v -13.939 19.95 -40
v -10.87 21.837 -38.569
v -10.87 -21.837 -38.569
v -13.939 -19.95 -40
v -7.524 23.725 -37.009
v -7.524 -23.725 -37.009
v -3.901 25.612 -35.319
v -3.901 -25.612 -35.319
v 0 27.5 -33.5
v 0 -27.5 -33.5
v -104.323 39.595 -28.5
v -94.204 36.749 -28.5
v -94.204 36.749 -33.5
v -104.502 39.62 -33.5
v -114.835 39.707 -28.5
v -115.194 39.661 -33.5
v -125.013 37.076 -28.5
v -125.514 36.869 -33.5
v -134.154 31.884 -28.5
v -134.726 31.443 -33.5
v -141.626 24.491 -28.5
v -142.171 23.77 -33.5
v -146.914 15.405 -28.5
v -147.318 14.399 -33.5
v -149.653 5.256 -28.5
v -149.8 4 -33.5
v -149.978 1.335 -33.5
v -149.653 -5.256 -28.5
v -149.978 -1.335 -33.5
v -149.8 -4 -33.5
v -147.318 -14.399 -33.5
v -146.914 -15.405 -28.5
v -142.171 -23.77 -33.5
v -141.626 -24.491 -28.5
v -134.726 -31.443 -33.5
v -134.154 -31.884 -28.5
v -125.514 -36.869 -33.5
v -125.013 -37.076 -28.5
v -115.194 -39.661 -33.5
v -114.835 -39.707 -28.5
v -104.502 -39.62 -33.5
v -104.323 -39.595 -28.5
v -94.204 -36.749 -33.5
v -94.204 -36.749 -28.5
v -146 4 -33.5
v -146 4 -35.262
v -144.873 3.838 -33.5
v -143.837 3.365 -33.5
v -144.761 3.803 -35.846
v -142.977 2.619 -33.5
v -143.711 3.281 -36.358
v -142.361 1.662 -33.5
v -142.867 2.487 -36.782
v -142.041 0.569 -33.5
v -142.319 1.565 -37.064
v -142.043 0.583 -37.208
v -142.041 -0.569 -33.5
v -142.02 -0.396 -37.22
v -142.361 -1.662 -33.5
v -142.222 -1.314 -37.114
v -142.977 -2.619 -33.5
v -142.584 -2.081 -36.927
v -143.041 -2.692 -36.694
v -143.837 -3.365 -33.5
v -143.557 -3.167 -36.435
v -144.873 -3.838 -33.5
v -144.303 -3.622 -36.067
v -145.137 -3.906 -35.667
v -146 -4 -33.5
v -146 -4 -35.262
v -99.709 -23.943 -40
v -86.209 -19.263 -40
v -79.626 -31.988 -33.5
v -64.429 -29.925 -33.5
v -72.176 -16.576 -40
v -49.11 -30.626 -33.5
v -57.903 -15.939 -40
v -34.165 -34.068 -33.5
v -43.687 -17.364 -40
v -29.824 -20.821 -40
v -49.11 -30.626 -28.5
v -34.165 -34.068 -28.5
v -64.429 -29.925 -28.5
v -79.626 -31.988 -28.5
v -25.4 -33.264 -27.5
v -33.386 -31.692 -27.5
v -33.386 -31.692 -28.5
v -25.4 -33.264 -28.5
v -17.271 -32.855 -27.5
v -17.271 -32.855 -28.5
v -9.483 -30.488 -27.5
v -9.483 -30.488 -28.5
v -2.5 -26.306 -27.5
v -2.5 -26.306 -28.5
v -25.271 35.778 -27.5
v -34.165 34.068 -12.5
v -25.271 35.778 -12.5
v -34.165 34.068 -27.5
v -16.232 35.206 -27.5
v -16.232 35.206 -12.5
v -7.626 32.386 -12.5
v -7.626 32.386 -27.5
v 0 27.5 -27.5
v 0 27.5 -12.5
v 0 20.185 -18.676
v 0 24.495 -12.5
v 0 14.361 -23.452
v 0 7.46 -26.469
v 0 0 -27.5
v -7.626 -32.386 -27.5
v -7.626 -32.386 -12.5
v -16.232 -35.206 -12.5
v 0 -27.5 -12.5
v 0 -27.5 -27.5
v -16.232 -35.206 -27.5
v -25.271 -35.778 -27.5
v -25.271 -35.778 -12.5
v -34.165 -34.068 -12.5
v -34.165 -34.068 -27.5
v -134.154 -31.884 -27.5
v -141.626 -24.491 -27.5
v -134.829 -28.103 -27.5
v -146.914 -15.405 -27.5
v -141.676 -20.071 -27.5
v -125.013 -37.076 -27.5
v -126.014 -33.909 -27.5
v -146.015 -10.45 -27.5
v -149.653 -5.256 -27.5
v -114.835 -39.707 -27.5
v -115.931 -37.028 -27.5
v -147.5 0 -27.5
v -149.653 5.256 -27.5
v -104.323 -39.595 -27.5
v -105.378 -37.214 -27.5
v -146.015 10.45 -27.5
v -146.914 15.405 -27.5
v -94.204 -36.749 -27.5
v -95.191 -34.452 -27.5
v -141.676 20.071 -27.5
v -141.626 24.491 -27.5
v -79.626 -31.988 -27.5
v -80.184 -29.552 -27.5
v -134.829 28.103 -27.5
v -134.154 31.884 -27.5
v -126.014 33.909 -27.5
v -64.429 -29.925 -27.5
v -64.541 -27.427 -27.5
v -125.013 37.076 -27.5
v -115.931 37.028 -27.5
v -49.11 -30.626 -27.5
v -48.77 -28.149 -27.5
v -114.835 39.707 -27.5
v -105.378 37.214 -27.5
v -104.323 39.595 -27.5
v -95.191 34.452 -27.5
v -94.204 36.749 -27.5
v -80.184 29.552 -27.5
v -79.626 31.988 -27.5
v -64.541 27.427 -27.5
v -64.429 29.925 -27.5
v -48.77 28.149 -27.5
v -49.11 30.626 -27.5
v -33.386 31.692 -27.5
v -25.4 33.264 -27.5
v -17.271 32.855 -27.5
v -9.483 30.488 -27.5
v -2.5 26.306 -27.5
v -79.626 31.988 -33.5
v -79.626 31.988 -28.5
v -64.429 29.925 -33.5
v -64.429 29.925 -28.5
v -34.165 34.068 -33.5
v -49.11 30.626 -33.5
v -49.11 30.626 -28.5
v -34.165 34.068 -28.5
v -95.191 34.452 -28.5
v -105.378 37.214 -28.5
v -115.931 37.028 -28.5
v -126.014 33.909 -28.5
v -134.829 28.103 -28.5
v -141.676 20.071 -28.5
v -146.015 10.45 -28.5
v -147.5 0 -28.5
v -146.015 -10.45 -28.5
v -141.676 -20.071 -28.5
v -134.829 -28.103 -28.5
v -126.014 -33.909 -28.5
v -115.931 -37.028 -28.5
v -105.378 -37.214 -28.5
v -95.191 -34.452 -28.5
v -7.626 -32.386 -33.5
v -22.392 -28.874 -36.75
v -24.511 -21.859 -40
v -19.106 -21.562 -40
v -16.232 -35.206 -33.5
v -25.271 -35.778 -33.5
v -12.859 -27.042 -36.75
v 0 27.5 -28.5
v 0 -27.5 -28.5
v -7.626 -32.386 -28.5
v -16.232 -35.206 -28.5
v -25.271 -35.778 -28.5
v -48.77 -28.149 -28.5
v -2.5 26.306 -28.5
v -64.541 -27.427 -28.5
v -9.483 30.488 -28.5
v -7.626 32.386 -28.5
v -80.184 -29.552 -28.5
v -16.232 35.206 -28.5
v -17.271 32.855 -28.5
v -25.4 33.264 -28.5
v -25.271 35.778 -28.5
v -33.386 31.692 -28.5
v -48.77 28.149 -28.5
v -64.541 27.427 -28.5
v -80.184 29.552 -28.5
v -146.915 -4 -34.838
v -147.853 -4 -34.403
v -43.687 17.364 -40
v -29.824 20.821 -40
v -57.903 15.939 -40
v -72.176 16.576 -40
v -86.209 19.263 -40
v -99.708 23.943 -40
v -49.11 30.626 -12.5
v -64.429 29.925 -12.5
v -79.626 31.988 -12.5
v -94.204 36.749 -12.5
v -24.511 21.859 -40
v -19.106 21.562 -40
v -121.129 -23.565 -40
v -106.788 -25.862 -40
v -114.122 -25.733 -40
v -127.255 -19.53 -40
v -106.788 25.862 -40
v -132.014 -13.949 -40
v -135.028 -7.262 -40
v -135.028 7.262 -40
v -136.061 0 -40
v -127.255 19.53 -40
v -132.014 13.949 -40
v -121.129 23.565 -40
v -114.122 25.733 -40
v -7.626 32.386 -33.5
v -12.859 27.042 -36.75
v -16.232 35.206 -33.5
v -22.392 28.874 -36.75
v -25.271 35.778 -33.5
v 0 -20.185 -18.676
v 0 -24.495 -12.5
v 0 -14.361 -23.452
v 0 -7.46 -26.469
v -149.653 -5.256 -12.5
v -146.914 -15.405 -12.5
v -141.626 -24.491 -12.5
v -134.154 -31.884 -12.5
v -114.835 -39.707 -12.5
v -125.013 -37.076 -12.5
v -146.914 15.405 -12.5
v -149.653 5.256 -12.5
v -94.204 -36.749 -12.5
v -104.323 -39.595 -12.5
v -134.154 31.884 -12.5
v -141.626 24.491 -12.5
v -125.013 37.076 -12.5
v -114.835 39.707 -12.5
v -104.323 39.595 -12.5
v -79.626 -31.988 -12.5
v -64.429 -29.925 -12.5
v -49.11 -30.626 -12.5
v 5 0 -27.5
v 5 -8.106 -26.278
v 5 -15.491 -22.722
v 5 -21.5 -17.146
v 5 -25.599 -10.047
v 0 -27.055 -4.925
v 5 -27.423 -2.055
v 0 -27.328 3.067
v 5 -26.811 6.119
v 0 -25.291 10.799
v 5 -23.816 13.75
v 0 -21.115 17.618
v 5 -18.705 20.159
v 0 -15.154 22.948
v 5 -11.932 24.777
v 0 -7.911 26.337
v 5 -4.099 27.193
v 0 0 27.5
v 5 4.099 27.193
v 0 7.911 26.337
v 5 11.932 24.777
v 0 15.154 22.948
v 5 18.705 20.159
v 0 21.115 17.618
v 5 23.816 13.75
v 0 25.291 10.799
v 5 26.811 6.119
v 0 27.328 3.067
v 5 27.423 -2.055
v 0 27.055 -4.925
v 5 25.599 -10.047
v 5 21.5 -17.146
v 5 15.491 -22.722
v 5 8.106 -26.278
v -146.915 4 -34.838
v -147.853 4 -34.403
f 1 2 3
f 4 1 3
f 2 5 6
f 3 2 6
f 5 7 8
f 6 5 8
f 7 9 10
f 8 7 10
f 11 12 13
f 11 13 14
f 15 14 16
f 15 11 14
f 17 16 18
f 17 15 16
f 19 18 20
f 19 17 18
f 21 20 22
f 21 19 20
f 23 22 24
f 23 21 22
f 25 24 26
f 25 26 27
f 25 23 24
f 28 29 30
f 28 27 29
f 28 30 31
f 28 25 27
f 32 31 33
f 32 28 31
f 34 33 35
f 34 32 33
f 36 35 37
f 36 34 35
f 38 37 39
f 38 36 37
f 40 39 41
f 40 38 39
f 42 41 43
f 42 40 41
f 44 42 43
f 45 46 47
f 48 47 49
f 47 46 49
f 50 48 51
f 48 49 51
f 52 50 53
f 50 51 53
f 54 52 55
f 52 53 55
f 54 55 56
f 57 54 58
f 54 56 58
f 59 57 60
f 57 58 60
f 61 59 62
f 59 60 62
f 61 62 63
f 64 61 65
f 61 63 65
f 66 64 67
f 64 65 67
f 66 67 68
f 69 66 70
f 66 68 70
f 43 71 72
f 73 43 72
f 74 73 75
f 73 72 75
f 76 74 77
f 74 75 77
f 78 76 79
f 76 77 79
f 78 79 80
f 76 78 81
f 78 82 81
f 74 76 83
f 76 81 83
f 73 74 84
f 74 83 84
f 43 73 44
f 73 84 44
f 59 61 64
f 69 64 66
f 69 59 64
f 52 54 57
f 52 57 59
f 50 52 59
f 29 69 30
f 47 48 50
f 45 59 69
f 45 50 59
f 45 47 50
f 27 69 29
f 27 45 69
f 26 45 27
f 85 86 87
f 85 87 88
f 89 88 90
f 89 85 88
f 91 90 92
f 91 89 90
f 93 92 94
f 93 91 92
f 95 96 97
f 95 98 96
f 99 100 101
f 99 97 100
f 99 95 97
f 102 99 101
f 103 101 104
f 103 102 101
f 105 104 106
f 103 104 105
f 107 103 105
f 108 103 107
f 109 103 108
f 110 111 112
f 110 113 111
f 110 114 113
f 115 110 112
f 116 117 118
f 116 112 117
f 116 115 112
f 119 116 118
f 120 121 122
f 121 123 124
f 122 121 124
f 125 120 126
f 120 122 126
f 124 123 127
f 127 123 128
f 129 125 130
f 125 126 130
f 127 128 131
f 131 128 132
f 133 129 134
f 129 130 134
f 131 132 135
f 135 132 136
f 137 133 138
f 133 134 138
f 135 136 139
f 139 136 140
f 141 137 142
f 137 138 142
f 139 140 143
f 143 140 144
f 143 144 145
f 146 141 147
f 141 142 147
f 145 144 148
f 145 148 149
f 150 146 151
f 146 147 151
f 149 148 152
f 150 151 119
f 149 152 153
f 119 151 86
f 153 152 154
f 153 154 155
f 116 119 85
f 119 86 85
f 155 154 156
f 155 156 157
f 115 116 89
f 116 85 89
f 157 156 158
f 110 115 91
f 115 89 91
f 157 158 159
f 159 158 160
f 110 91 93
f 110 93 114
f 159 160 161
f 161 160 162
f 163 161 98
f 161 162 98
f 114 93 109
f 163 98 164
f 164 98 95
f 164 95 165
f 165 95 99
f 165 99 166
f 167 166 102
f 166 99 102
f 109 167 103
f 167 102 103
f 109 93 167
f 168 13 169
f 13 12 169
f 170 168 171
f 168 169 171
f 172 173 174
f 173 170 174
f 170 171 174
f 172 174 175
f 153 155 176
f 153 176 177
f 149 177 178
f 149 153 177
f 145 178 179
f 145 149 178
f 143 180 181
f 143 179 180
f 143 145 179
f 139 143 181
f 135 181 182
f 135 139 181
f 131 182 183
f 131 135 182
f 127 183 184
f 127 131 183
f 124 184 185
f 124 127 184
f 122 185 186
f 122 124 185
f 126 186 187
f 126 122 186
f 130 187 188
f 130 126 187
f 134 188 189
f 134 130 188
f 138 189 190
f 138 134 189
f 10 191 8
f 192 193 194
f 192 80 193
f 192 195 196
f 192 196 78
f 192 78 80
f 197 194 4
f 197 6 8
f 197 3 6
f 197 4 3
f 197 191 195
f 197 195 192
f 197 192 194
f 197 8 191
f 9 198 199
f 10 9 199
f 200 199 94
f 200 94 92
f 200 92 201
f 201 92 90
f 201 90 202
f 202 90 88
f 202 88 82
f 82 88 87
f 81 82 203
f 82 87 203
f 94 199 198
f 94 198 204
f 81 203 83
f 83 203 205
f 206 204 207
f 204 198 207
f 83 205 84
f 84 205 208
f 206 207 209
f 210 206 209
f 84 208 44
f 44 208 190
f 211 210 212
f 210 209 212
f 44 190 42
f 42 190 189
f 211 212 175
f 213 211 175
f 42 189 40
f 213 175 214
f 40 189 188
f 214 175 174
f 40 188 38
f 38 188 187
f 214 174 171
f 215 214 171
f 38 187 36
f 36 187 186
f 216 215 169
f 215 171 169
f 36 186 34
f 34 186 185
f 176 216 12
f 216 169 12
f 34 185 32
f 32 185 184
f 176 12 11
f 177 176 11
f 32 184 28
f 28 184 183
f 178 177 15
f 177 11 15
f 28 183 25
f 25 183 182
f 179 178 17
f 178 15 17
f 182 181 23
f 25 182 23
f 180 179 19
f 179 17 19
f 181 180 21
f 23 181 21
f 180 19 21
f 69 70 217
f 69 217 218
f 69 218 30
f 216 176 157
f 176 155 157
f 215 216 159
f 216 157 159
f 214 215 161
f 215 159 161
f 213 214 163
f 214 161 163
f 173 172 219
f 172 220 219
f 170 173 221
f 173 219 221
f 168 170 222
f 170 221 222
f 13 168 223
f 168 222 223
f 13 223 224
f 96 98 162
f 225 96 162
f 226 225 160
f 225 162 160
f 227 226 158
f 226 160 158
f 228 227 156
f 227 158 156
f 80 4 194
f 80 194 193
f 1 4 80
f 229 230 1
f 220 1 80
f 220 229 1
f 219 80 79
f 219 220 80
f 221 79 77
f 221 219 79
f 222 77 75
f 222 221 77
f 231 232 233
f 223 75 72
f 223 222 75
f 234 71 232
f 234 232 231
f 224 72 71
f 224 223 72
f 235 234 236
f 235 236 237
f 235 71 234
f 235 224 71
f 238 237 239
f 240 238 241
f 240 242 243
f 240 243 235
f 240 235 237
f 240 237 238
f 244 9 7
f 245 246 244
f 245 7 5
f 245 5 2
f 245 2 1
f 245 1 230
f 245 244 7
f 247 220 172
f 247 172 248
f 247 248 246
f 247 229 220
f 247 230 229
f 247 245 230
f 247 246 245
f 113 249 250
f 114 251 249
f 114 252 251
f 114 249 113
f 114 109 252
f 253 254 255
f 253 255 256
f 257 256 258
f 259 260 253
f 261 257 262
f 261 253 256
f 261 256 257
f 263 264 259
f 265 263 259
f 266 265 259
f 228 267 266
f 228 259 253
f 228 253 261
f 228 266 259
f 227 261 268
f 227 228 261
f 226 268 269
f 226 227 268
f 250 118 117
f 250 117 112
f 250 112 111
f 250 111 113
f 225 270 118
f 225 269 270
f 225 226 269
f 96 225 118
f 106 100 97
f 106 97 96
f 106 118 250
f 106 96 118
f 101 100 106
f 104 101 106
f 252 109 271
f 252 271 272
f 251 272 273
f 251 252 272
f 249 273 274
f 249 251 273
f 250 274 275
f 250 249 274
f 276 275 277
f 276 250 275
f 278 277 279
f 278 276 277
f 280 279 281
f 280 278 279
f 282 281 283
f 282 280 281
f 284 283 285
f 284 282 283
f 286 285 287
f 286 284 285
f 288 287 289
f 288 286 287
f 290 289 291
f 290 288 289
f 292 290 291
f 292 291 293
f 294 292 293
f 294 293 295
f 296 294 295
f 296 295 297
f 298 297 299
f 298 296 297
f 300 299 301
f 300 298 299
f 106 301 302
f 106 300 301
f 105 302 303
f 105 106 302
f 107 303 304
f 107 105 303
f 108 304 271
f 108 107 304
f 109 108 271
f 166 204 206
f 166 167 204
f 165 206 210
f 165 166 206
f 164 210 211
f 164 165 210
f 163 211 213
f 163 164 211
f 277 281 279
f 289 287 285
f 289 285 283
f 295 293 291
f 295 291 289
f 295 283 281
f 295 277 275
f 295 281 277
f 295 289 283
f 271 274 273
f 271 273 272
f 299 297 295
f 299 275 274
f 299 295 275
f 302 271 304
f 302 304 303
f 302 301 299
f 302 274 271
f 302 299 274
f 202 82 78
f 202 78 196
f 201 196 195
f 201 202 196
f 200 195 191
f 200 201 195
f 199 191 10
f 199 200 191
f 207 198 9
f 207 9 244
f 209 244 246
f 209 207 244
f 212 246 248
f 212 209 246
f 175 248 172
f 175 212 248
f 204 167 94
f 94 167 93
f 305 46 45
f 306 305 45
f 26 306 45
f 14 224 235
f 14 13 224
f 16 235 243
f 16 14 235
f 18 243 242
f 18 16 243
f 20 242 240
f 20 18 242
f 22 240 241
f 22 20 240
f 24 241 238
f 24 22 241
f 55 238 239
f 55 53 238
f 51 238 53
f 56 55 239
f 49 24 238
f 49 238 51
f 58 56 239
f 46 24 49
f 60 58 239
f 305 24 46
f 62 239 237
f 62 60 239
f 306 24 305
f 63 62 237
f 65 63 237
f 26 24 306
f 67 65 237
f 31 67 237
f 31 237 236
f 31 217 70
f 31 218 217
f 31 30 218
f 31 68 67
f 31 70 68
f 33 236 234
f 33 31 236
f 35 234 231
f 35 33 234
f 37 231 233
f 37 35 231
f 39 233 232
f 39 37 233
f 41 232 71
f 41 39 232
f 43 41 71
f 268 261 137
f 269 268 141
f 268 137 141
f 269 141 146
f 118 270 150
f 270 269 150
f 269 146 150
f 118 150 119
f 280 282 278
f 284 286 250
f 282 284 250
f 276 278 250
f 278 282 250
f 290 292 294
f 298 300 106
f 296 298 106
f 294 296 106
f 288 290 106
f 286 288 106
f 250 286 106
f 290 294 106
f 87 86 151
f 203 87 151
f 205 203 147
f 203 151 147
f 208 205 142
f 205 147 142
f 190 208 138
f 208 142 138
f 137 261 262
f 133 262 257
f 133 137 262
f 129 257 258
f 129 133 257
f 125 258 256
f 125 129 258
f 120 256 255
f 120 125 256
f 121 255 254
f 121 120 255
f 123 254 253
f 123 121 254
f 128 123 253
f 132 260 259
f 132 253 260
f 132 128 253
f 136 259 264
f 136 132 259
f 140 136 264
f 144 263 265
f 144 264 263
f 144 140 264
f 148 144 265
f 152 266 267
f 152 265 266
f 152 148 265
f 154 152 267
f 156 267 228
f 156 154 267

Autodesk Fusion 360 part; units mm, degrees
sketch "Sketch1" plane through (0, 0, 0) normal (1, 0, 0) x (0, 0, -1)
  circle A0 centre (0, 0) radius 27.5
  dimension "d1" = 55
extrude "Extrude1" add sketch "Sketch1" along normal blind 5
ref_plane "WorkPlane1" through (0, 0, -27.5) normal (0, 0, 1) x (1, 0, 0)
sketch "Sketch2" plane through (0, 0, -27.5) normal (0, 0, 1) x (1, 0, 0)
  line L0 (0, 0) -> (-150, 0)
  line L1 (0, 0) -> (-23, 0)
  line L2 (-150, 0) -> (-110, 0)
  line L3 (0, 0) -> (0, 27.5)
  circle A0 centre (-23, 0) radius 35.8504
  circle A1 centre (-110, 0) radius 40
  line L4 (0, 27.5) -> (0, -27.5)
  arc A2 (-94.2038, 36.7489) -> (-34.165, 34.0675) centre (-60.6369, 114.8402) ccw
  arc A3 (-34.165, -34.0675) -> (-94.2038, -36.7489) centre (-60.6369, -114.8402) ccw
  point P0 (0, -27.5)
  point P1 (0, 27.5)
  dimension "d6" = 150
  dimension "d7" = 23
  dimension "d8" = 40
  dimension "d9" = 27.5
  dimension "d10" = 85
extrude "Extrude2" add sketch "Sketch2" along normal blind 15 contours L0 L1 A0 L4 | L0 L1 L3 A0 L4 | L0 A0 A1 A3 | L0 A0 A1 A2 | L0 L2 A1 | L0 L2 A1
sketch "Sketch3" plane through (0, 0, -27.5) normal (0, 0, -1) x (-1, 0, 0)
  arc A0 (34.165, 34.0675) -> (0, 27.5) centre (23, 0) ccw
  line L0 (0, 27.5) -> (0, 0)
  line L1 (0, 0) -> (0, -27.5)
  arc A1 (0, -27.5) -> (34.165, -34.0675) centre (23, 0) ccw
  arc A2 (94.2038, -36.7489) -> (34.165, -34.0675) centre (60.6369, -114.8402) ccw
  arc A3 (94.2038, -36.7489) -> (94.2038, 36.7489) centre (110, 0) ccw
  arc A4 (34.165, 34.0675) -> (94.2038, 36.7489) centre (60.6369, 114.8402) ccw
  arc A5 (95.1911, -34.4521) -> (95.1911, 34.4521) centre (110, 0) ccw
  arc A6 (33.3864, 31.6918) -> (95.1911, 34.4521) centre (60.6369, 114.8402) ccw
  arc A7 (33.3864, 31.6918) -> (2.5, 26.3059) centre (23, 0) ccw
  line L2 (2.5, 26.3059) -> (2.5, 0)
  line L3 (2.5, 0) -> (2.5, -26.3059)
  arc A8 (2.5, -26.3059) -> (33.3864, -31.6918) centre (23, 0) ccw
  arc A9 (95.1911, -34.4521) -> (33.3864, -31.6918) centre (60.6369, -114.8402) ccw
  dimension "d13" = 2.5
extrude "Extrude3" add sketch "Sketch3" along normal blind 1 contours A5 A6 A7 L2 L3 A8 A9
sketch "Sketch4" plane through (0, 0, -28.5) normal (0, 0, -1) x (-1, 0, 0)
  arc A0 (33.3864, 31.6918) -> (2.5, 26.3059) centre (23, 0) ccw
  line L0 (2.5, 26.3059) -> (2.5, -26.3059)
  arc A1 (2.5, -26.3059) -> (33.3864, -31.6918) centre (23, 0) ccw
  arc A2 (95.1911, -34.4521) -> (33.3864, -31.6918) centre (60.6369, -114.8402) ccw
  arc A3 (95.1911, -34.4521) -> (95.1911, 34.4521) centre (110, 0) ccw
  arc A4 (33.3864, 31.6918) -> (95.1911, 34.4521) centre (60.6369, 114.8402) ccw
  arc A5 (94.2038, -36.7489) -> (94.2038, 36.7489) centre (110, 0) ccw
  arc A6 (34.165, 34.0675) -> (94.2038, 36.7489) centre (60.6369, 114.8402) ccw
  arc A7 (34.165, 34.0675) -> (0, 27.5) centre (23, 0) ccw
  line L1 (0, 27.5) -> (0, -27.5)
  arc A8 (0, -27.5) -> (34.165, -34.0675) centre (23, 0) ccw
  arc A9 (94.2038, -36.7489) -> (34.165, -34.0675) centre (60.6369, -114.8402) ccw
  dimension "d16" = -2.5
extrude "Extrude4" add sketch "Sketch4" along normal blind 5 contours A0 L0 A1 A2 A3 A4 | A5 A6 A7 L1 A8 A9
extrude "Extrude5" add 1 faces at (-110.551, 8.9771, -33.5) along direction (0, 0, -1) blind 6.5 draft -65
sketch "Sketch5" plane through (0, 0, -40) normal (0, 0, -1) x (-1, 0, 0)
  arc A0 (29.8238, 20.8214) -> (99.7085, 23.9425) centre (60.6369, 114.8402) ccw
  arc A1 (29.8238, 20.8214) -> (13.9393, 19.9499) centre (23, 0) ccw
  line L0 (13.9393, 19.9499) -> (13.9393, -19.9499)
  arc A2 (13.9393, -19.9499) -> (29.8238, -20.8214) centre (23, 0) ccw
  arc A3 (99.7085, -23.9425) -> (29.8238, -20.8214) centre (60.6369, -114.8402) ccw
  arc A4 (99.7085, -23.9425) -> (99.7085, 23.9425) centre (110, 0) ccw
  line L1 (150, 0) -> (146, 0)
  circle A5 centre (146, 0) radius 4
  line L2 (146, 4) -> (151, 4)
  line L3 (146, -4) -> (151, -4)
  line L4 (151, 4) -> (151, -4)
  dimension "d21" = 4
  dimension "d22" = 8
  dimension "d23" = 5
extrude "Extrude6" cut sketch "Sketch5" against normal blind 6.5 contours A5 | A5 L2 L3 L4
